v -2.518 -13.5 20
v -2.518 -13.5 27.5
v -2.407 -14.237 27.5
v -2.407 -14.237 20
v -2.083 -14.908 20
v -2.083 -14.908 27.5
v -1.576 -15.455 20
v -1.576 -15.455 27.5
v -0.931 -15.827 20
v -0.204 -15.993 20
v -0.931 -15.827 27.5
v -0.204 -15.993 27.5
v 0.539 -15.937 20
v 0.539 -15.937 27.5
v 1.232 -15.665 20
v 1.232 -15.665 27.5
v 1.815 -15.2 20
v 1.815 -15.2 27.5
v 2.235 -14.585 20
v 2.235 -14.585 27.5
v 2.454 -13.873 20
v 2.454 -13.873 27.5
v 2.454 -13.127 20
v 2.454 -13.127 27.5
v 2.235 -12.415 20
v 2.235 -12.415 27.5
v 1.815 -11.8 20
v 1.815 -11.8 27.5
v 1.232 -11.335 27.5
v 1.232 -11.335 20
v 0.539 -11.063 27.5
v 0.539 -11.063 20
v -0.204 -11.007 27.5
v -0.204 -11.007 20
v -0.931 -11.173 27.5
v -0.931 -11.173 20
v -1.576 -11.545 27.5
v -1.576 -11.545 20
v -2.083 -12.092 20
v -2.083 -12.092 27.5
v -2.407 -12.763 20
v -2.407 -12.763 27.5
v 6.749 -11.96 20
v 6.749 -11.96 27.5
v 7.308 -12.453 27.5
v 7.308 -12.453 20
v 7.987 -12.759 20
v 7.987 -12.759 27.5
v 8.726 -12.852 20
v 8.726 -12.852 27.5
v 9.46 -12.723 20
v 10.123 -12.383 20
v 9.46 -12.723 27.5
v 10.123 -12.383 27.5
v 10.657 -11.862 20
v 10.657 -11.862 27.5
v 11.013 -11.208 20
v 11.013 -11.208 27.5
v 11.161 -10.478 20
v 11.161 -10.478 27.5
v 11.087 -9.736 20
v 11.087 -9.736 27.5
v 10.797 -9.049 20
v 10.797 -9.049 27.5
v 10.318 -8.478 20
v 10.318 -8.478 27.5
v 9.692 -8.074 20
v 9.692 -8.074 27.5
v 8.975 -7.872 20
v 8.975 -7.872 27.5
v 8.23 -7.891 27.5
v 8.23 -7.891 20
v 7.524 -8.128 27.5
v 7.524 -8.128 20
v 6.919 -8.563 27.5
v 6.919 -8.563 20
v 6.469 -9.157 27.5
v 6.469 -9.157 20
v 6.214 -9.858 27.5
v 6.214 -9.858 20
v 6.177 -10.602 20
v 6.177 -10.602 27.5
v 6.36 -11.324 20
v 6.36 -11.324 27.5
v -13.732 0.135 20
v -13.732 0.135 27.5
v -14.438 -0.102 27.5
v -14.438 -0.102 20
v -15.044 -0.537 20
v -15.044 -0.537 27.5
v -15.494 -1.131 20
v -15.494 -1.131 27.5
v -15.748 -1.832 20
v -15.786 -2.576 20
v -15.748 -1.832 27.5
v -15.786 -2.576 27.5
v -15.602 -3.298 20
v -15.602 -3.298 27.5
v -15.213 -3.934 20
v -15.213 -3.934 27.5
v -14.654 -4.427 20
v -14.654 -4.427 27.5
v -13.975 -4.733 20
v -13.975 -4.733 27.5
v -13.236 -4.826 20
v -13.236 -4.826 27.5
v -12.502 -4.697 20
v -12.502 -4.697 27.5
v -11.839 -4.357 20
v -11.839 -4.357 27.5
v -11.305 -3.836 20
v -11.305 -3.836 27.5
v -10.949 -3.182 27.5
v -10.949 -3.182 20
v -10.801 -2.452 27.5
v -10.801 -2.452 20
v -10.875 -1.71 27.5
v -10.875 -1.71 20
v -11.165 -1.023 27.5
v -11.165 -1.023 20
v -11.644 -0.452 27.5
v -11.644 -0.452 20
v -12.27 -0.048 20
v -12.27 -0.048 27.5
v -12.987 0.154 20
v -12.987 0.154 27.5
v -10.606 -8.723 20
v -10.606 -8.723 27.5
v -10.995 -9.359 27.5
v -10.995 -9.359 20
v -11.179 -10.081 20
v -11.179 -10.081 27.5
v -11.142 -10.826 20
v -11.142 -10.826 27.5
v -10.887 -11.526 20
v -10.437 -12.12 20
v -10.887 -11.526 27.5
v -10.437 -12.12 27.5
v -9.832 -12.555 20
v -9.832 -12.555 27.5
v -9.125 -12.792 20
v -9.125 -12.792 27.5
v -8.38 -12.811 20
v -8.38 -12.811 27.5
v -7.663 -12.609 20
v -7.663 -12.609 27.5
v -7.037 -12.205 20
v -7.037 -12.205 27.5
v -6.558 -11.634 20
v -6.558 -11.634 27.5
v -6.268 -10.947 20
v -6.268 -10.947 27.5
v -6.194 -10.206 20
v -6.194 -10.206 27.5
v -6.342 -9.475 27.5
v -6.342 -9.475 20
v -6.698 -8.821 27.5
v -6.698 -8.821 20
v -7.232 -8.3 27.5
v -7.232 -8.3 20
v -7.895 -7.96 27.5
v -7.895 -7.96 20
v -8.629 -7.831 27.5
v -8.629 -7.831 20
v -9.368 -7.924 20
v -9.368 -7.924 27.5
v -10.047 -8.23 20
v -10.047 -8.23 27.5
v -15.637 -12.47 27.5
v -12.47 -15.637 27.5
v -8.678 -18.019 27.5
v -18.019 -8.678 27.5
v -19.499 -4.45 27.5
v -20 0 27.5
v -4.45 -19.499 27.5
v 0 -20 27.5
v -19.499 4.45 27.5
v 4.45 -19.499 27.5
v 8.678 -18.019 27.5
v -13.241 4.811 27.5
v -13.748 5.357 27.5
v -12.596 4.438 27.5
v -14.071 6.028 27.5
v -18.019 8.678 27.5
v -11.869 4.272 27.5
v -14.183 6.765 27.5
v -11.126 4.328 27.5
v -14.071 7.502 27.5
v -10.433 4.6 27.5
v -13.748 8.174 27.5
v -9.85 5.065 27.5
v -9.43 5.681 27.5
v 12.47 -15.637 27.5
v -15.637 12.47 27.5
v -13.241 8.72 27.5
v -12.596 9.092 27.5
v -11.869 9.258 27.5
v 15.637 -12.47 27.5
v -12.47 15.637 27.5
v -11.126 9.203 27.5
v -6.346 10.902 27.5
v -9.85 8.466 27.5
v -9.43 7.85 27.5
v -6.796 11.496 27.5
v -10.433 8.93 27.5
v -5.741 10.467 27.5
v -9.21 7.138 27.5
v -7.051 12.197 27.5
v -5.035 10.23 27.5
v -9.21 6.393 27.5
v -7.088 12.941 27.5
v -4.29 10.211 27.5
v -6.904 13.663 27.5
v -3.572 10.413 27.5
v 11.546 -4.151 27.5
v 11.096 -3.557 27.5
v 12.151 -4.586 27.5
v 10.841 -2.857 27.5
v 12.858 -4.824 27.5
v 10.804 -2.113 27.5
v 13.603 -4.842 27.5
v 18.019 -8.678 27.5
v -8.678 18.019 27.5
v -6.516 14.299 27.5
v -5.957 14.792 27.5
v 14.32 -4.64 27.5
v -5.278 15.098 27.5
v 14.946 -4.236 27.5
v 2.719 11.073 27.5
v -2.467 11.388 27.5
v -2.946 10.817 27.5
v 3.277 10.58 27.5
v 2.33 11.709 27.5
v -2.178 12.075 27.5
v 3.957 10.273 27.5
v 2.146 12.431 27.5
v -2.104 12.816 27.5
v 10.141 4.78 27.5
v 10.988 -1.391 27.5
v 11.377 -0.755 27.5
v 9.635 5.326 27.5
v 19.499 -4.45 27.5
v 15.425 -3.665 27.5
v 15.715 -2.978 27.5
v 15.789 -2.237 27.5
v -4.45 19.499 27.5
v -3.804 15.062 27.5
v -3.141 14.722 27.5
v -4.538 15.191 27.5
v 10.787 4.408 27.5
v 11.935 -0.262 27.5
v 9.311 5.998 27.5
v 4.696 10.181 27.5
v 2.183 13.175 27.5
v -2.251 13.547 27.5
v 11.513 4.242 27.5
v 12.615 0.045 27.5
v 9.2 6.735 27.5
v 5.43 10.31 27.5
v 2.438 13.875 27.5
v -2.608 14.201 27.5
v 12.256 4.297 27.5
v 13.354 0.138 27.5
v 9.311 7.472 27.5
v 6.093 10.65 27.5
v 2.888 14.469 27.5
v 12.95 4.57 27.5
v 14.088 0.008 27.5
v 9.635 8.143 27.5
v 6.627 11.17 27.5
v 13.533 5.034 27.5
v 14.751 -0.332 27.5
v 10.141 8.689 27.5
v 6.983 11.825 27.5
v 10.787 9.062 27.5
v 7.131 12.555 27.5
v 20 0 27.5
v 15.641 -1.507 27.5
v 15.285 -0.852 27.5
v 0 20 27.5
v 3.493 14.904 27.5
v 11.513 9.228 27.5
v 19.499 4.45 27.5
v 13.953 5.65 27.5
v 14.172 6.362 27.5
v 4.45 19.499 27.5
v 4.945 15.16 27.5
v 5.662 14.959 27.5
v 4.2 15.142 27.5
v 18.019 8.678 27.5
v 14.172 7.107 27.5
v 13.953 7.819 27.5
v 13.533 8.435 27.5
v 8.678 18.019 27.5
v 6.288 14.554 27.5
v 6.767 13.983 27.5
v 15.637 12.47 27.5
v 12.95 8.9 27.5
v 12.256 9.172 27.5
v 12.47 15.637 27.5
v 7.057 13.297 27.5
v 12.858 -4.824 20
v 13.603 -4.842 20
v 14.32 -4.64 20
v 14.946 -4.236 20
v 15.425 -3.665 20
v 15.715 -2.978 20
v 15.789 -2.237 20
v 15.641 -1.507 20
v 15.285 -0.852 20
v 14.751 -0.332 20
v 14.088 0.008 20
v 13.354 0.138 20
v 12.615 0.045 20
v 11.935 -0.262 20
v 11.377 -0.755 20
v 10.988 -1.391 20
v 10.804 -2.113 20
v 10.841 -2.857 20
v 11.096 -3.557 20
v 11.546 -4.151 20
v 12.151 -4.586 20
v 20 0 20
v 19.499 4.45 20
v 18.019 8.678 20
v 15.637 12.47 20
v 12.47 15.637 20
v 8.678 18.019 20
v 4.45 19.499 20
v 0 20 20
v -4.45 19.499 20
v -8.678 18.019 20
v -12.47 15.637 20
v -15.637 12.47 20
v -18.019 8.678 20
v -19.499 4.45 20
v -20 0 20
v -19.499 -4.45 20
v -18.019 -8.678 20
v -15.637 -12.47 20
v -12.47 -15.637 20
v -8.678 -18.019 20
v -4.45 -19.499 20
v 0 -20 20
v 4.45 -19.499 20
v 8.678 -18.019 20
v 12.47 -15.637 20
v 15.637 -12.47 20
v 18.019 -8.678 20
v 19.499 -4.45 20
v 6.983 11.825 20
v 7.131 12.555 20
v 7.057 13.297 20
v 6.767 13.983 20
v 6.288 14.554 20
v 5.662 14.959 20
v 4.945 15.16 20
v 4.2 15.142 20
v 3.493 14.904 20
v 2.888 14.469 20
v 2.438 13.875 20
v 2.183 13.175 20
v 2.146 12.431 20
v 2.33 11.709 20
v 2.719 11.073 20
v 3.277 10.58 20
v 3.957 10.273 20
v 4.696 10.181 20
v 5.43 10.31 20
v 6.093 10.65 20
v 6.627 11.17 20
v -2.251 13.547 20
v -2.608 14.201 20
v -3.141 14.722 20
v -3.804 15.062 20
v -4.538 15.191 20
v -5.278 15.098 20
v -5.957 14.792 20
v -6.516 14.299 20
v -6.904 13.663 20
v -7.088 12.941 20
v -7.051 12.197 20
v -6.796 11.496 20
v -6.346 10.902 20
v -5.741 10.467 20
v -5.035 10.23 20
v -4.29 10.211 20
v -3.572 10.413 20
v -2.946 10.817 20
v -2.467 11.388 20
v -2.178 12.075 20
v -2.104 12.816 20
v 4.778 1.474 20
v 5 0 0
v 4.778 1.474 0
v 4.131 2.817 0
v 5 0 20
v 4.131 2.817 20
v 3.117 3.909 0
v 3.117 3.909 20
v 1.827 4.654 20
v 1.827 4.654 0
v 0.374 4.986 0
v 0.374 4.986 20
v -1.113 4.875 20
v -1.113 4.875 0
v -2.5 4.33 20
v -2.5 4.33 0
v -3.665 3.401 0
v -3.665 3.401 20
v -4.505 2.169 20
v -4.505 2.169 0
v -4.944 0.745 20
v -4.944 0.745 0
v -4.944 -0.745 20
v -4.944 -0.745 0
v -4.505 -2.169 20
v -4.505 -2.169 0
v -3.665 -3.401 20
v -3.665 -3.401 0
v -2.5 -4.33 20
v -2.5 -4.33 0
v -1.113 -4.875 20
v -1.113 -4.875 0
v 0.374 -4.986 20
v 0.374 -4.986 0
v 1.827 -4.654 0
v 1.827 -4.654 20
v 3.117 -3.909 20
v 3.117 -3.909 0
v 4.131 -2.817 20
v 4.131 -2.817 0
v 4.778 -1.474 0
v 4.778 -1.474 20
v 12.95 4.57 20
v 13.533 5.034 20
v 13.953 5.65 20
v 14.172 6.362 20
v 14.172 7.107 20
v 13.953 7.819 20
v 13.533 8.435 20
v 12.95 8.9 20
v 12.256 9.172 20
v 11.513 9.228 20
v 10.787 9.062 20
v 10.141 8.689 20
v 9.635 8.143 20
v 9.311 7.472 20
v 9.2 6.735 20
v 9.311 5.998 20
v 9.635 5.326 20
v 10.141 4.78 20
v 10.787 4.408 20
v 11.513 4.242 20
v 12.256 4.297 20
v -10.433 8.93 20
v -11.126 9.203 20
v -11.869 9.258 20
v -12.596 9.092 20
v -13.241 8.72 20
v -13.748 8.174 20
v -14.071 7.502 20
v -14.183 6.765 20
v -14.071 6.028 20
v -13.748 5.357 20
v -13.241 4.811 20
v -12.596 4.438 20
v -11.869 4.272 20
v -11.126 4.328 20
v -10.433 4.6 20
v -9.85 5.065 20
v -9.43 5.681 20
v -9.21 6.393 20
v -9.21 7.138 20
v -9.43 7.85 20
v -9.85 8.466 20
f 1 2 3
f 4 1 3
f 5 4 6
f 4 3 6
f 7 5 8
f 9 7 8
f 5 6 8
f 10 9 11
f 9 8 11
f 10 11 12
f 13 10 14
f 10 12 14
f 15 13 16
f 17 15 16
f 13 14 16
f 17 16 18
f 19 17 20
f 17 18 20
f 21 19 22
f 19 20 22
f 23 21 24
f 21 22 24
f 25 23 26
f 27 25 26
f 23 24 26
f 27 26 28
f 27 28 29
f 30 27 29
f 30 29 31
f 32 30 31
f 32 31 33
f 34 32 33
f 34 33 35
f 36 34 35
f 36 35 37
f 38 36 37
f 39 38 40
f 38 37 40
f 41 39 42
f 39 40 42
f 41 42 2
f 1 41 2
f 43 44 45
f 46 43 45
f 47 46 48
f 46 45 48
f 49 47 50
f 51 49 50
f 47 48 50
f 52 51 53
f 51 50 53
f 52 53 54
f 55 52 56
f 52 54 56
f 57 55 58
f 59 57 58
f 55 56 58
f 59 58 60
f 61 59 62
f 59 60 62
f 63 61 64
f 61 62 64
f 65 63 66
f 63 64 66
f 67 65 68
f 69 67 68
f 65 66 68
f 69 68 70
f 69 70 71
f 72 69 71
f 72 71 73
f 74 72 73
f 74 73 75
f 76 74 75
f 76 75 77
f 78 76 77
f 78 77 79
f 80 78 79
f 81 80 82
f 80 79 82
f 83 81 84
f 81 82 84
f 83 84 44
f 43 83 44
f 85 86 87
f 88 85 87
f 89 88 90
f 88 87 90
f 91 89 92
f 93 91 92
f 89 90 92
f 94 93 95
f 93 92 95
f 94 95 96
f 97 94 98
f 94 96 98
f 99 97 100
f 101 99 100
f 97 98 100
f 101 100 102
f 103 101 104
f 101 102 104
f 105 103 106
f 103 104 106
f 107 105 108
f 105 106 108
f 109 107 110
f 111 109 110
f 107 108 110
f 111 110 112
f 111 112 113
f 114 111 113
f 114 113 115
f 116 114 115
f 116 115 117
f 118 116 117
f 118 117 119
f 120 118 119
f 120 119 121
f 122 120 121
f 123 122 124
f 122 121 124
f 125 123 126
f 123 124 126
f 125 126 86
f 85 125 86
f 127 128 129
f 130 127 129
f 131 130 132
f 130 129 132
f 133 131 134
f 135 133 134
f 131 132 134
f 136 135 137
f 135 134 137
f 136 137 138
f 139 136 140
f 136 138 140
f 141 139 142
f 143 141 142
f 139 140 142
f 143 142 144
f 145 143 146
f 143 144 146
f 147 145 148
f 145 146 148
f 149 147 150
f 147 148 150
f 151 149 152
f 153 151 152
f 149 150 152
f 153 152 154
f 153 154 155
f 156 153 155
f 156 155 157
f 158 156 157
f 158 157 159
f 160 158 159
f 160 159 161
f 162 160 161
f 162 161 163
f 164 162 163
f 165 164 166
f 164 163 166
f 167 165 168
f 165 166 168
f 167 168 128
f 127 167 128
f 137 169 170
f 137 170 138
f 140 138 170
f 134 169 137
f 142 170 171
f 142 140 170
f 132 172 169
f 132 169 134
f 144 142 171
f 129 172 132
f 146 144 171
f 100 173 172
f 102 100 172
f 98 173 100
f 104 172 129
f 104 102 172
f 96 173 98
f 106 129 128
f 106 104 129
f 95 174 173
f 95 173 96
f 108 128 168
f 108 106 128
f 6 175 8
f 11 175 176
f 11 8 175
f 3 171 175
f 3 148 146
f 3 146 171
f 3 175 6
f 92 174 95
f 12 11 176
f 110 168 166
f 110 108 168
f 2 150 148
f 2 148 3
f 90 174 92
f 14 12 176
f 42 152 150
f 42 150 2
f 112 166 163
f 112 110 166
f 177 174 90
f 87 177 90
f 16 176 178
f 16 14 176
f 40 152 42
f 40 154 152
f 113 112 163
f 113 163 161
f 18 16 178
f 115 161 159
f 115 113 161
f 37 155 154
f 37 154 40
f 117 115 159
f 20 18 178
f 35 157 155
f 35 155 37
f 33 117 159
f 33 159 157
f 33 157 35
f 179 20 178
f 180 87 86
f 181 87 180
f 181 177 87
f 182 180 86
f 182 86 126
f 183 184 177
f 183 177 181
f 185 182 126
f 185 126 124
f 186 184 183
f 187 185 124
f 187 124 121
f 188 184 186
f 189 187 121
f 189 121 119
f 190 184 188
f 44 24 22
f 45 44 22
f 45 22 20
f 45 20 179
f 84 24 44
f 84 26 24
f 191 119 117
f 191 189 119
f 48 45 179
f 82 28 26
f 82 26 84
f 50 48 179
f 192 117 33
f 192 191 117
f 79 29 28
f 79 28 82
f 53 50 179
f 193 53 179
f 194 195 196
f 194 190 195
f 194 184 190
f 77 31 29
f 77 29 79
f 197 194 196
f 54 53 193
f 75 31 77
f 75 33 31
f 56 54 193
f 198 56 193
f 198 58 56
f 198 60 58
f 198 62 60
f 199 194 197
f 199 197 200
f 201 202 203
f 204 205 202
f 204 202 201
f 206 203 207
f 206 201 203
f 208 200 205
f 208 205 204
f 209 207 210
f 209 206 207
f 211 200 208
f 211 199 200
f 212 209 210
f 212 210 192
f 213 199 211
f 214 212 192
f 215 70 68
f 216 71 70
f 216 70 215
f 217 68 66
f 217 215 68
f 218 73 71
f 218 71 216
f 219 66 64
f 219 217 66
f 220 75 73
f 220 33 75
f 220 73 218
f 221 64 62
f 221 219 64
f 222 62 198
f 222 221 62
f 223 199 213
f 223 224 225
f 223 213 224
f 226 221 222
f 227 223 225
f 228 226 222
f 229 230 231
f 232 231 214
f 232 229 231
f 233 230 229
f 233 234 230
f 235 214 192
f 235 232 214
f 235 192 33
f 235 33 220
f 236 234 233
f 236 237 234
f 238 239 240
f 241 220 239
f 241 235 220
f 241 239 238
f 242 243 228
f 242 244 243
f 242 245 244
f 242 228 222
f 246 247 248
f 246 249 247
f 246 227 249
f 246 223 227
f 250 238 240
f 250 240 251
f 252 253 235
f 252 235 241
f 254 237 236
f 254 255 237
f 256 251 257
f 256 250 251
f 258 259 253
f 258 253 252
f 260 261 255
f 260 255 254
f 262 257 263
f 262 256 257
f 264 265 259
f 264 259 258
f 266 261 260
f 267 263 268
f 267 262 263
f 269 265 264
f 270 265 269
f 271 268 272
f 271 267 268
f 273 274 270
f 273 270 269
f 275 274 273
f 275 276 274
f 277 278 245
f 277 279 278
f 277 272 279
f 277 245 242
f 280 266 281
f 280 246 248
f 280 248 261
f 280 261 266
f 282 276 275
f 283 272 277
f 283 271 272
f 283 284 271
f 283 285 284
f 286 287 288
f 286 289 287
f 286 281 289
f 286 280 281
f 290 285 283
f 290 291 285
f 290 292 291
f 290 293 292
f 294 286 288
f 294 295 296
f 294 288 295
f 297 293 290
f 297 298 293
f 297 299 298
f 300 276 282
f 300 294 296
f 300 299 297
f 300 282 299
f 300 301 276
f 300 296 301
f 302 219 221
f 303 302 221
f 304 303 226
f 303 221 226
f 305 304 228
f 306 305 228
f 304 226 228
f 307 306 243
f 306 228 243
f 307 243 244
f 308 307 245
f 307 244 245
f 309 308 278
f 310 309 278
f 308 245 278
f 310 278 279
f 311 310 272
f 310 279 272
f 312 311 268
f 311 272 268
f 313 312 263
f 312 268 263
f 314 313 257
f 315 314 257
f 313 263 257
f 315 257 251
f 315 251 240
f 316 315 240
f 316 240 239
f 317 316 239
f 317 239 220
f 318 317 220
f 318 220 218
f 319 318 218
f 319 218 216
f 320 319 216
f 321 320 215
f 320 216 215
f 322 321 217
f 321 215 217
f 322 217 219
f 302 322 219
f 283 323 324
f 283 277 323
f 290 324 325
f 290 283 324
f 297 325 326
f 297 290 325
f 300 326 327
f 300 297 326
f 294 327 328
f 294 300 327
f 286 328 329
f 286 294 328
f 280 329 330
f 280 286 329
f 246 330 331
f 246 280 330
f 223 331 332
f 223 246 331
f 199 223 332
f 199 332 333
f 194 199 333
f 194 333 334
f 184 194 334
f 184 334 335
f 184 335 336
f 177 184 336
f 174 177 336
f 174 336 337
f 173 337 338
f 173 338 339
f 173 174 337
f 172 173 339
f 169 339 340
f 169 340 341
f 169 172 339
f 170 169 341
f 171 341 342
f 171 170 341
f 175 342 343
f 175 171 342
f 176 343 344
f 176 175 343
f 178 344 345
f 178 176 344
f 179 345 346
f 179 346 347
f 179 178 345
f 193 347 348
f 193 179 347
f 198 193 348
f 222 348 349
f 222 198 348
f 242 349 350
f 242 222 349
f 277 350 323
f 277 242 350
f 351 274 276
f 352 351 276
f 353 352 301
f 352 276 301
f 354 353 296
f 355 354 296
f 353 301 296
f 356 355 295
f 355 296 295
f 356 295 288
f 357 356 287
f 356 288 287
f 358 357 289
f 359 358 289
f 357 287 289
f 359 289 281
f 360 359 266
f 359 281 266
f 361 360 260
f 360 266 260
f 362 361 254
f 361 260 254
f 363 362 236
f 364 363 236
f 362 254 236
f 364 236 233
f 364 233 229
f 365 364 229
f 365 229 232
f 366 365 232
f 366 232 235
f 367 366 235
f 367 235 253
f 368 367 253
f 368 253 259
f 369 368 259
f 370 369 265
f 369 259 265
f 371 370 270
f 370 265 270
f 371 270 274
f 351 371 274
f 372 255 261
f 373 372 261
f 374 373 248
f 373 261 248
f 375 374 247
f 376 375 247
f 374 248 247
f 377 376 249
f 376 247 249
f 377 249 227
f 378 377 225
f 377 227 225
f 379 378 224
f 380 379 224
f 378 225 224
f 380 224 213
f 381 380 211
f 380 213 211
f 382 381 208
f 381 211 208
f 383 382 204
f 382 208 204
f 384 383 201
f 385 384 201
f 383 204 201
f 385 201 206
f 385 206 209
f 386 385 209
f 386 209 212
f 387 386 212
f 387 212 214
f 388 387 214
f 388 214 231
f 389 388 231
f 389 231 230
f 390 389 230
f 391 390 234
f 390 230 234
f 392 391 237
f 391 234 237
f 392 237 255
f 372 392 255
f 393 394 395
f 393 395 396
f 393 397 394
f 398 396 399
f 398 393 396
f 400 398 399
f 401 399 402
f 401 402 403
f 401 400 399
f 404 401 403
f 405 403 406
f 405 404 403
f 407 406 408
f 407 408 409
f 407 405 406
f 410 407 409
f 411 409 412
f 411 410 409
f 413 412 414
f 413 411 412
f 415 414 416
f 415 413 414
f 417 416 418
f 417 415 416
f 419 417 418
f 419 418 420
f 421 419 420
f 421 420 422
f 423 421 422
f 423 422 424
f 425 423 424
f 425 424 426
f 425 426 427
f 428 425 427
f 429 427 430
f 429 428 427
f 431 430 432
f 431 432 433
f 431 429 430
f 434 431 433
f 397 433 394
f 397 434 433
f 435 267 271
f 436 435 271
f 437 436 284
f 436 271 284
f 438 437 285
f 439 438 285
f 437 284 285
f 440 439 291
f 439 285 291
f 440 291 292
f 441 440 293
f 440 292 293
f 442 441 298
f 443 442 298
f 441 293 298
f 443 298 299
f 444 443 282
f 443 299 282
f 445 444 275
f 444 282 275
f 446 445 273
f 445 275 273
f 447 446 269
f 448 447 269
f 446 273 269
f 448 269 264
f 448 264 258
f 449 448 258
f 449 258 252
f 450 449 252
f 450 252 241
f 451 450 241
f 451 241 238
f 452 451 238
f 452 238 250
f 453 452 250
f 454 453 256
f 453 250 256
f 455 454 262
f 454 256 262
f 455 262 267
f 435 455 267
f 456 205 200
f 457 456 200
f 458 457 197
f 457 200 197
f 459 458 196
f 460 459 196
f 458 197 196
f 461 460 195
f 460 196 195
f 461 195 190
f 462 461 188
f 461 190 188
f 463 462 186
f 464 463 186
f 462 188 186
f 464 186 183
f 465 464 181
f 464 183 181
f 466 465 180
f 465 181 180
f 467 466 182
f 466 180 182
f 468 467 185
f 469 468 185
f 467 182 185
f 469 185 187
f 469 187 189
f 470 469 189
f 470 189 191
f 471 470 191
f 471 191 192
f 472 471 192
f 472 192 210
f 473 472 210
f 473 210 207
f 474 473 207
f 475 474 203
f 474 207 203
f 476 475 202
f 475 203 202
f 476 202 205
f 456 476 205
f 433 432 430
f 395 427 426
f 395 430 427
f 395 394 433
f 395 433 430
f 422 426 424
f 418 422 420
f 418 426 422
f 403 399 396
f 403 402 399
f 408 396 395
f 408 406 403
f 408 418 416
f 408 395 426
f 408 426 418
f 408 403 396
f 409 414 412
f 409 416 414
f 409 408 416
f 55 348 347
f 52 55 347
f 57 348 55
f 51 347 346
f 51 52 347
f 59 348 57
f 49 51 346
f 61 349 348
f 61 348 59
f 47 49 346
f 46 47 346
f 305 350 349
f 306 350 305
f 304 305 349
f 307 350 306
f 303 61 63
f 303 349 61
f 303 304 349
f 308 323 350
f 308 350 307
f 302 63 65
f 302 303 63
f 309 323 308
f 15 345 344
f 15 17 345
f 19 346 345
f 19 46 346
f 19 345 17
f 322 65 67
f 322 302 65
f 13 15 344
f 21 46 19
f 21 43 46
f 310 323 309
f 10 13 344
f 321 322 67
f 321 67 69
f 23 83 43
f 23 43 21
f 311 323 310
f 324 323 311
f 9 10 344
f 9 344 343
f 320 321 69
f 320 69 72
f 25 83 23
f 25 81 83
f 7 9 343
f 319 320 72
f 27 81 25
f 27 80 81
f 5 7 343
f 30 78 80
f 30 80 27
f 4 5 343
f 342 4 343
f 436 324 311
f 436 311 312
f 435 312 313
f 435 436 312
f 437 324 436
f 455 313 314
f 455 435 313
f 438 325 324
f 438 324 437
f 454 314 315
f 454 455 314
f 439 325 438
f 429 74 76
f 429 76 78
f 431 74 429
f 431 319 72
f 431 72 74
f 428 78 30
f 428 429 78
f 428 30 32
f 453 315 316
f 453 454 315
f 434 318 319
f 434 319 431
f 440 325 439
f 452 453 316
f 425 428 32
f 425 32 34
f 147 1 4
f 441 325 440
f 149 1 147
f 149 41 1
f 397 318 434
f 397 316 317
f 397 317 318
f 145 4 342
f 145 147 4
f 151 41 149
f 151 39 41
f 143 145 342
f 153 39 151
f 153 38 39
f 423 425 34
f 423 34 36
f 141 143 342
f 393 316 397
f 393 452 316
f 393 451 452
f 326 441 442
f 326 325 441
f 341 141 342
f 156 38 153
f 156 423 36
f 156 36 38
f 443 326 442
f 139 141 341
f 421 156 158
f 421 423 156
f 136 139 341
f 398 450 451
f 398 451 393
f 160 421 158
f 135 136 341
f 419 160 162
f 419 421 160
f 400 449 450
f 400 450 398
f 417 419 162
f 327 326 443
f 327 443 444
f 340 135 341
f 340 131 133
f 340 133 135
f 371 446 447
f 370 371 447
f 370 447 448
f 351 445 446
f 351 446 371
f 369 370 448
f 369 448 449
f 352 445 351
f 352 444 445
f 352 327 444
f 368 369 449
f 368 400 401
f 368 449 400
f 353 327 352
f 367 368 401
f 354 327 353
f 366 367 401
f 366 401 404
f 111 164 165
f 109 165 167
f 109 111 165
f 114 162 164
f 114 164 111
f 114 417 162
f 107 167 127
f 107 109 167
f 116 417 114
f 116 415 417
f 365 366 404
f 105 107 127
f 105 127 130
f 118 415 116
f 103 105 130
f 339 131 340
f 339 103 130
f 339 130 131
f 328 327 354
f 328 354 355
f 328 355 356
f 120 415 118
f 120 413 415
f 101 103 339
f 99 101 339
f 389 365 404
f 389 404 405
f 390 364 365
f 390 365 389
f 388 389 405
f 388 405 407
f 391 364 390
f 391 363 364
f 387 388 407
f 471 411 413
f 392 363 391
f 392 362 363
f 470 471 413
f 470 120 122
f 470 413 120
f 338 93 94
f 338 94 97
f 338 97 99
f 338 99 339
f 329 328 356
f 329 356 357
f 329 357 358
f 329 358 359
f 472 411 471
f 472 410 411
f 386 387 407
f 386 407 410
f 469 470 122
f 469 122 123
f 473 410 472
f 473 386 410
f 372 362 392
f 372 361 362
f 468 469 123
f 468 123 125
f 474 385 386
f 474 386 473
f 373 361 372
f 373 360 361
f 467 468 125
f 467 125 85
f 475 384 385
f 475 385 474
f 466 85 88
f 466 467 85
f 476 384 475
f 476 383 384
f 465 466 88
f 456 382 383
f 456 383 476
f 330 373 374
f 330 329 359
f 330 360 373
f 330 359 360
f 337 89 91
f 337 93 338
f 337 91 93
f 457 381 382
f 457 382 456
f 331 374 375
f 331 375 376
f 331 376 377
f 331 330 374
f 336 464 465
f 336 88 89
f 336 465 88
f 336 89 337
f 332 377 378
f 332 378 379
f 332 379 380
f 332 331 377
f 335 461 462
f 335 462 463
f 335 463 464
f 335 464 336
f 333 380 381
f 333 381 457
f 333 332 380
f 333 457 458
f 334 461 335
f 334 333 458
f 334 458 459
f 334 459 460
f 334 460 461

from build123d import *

# Parameters (mm, degrees)
SKETCH001_R        = 2.5
POCKET_DEPTH       = 7.5
POLARPATTERN_COUNT = 9


with BuildPart() as part:
    # Sketch → Revolution (revolve)
    with BuildSketch(Plane.XZ):
        Polygon((0, 0), (5, 0), (5, 20), (20, 20), (20, 27.5), (0, 27.5), align=None)
    revolve(axis=Axis((0, 0, 0), (0, 0, 1)))

    # Sketch001 (on Face5 of Revolution) → Pocket (cut)
    with BuildSketch(Plane(origin=(0, 0, 27.5), x_dir=(-1, 0, 0), z_dir=(0, 0, 1))):
        with Locations((0.017617, 13.499989)):
            Circle(SKETCH001_R)
    pocket = extrude(amount=-POCKET_DEPTH, mode=Mode.SUBTRACT)

    # PolarPattern: Pocket ×9 about axis
    polarpattern_axis = Axis((0, 0, 27.5), (0, 0, 1))
    for i in range(1, POLARPATTERN_COUNT):
        add(pocket.rotate(polarpattern_axis, i * 360 / POLARPATTERN_COUNT), mode=Mode.SUBTRACT)


solid = part.part
